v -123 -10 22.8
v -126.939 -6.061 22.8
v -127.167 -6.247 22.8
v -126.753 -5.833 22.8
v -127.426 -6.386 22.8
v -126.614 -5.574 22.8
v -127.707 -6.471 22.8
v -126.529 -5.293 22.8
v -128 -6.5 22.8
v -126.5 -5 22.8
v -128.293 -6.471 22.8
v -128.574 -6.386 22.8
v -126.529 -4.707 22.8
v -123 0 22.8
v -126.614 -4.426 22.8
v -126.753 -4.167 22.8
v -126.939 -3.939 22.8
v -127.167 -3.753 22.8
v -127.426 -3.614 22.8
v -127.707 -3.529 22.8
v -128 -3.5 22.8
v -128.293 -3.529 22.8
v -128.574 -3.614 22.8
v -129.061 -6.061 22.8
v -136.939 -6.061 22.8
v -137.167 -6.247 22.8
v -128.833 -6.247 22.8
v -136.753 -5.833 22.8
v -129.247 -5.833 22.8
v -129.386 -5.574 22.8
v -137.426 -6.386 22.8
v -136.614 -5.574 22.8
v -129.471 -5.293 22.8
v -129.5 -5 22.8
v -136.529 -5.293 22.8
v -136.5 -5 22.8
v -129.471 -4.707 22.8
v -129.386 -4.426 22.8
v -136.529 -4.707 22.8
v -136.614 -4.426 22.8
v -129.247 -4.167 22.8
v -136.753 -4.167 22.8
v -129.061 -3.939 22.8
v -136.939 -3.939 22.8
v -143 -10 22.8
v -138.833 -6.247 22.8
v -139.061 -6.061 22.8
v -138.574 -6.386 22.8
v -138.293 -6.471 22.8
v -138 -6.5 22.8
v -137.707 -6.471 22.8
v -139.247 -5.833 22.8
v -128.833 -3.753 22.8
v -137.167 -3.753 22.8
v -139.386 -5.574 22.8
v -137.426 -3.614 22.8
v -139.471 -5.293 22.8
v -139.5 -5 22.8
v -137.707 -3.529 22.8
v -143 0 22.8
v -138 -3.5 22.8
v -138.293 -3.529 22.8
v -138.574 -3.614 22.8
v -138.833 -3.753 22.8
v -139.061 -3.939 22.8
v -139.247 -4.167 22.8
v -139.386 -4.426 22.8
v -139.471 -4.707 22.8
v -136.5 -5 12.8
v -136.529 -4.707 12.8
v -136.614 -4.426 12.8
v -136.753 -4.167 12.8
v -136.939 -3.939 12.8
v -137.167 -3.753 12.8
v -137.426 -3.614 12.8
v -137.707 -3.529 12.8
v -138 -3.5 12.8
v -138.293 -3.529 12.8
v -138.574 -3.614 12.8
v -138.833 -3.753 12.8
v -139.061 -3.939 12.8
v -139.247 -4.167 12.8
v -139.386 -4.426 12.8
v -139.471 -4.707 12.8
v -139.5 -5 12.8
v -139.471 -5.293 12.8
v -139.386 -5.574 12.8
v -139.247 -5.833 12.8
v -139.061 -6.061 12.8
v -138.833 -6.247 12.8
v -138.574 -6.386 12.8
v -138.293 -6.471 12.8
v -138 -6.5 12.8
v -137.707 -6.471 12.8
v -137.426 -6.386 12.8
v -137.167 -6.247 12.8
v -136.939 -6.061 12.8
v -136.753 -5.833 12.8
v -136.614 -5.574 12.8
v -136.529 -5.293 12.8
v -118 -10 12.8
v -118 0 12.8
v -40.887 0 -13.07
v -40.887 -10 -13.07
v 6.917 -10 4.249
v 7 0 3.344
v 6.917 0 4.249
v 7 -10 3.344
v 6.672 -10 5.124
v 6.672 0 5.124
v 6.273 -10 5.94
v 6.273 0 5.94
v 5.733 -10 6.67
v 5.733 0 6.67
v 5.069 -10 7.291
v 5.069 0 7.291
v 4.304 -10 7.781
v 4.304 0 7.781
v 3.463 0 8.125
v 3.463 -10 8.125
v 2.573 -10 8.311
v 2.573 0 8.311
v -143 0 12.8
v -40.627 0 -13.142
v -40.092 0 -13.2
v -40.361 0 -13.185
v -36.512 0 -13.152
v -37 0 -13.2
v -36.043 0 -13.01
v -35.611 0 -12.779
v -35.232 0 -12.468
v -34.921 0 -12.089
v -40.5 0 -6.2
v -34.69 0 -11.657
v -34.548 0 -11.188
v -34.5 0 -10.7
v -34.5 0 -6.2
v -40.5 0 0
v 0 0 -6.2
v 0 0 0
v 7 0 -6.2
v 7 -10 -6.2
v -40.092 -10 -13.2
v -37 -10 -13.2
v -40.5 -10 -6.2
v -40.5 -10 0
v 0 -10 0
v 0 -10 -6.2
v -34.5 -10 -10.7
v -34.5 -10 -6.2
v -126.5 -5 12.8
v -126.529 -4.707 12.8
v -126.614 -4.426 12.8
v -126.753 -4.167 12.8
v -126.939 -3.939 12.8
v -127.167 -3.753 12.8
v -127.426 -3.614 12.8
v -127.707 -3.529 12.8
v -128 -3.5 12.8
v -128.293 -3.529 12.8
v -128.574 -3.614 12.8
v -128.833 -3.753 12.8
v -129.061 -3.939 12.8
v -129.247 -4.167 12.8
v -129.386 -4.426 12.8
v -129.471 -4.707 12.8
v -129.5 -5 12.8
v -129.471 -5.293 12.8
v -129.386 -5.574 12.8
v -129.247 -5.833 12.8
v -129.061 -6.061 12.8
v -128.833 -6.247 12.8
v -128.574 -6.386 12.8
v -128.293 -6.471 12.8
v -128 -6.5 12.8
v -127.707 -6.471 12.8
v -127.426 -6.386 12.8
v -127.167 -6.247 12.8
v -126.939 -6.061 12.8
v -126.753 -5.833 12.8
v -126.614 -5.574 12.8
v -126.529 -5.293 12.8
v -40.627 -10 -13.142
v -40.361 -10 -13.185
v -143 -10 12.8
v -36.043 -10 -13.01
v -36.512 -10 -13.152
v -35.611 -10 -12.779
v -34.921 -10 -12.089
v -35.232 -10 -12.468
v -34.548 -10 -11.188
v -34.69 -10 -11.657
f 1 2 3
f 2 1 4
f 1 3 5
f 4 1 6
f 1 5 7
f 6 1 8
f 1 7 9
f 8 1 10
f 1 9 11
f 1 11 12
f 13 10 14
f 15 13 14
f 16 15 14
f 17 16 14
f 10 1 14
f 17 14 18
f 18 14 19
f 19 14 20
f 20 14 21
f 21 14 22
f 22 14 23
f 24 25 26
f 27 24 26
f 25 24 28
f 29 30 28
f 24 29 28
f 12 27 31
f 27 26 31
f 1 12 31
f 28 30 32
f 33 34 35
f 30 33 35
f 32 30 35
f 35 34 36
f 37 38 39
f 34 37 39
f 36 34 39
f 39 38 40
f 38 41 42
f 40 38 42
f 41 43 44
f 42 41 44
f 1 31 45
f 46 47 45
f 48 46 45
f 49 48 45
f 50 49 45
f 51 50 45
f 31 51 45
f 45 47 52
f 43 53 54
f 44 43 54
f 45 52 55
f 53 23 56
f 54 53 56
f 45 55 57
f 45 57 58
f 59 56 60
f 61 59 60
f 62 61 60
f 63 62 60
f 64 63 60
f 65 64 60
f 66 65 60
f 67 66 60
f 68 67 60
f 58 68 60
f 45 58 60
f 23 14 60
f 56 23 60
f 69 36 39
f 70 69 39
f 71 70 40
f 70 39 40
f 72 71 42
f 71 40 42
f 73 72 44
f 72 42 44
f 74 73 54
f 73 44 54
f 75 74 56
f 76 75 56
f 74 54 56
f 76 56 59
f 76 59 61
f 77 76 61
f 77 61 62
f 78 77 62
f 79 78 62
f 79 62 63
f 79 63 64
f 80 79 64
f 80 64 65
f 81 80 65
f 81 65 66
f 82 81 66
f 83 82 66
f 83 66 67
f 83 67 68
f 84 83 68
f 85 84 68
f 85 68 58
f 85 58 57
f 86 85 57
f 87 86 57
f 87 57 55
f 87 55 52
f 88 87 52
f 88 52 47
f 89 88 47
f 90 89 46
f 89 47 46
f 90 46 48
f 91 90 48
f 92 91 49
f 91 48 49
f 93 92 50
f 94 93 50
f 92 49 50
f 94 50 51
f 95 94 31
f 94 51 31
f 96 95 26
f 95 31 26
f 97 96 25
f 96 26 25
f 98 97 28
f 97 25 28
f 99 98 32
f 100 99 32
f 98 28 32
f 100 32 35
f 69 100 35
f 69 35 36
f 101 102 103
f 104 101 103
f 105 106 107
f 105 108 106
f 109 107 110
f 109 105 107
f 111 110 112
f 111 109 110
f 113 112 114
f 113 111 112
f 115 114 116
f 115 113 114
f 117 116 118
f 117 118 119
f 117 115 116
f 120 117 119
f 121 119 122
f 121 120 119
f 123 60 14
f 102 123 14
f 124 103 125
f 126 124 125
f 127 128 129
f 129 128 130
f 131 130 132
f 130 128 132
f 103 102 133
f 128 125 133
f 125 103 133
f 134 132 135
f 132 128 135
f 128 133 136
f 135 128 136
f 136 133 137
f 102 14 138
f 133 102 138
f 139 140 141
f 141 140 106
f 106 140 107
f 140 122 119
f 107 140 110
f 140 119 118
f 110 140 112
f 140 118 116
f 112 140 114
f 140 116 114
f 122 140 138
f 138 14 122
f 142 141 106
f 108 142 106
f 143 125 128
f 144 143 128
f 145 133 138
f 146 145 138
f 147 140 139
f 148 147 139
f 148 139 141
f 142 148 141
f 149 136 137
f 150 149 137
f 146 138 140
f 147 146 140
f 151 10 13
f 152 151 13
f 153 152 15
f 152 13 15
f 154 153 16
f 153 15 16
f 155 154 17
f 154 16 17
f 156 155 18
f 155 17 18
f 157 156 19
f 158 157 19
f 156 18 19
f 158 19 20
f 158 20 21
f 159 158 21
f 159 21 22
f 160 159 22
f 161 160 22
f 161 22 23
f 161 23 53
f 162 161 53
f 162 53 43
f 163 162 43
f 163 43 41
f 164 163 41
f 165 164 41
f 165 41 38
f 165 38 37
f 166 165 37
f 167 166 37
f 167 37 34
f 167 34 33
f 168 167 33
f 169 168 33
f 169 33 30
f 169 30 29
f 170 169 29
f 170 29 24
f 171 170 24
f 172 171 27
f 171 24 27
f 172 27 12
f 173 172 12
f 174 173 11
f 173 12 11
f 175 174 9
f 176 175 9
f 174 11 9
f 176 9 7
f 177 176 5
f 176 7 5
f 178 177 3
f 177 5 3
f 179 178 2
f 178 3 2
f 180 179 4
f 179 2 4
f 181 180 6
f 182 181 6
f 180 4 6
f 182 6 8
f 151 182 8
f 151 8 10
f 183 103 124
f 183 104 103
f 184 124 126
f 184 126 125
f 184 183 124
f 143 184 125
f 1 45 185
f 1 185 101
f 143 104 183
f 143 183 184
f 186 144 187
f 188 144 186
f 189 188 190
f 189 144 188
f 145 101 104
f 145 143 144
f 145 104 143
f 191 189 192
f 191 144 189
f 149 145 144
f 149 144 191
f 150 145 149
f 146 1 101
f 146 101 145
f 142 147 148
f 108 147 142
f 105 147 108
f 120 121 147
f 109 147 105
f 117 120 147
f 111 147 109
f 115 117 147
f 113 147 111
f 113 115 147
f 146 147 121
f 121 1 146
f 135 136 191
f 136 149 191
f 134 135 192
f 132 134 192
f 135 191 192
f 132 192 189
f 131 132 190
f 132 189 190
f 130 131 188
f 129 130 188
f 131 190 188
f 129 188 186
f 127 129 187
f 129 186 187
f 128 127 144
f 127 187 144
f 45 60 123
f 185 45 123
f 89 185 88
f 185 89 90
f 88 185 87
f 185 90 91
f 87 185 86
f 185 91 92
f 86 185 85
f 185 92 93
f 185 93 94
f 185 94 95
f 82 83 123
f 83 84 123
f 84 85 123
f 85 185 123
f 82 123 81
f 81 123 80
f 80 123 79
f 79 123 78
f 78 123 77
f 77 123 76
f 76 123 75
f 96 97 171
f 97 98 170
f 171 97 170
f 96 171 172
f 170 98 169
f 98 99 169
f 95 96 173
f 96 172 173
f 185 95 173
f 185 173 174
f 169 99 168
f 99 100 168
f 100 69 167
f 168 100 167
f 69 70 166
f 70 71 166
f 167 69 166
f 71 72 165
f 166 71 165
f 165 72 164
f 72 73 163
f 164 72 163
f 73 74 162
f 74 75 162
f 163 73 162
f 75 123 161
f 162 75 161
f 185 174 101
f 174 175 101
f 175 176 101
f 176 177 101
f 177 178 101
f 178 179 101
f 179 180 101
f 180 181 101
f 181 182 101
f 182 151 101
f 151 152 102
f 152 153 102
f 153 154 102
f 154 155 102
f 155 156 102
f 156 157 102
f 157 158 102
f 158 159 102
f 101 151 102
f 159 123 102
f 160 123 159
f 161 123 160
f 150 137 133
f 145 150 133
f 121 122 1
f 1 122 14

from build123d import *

# Parameters (mm, degrees)
F1_DEPTH = 10
F2_R     = 5
F3_R     = 2.5
F4_R     = 1.5
F5_DEPTH = 25


with BuildPart() as f1:
    # F0 (on Front) → F1 (new body)
    with BuildSketch(Plane.XZ):
        Polygon((-40.5, 0), (0, 0), (0, -6.2), (7, -6.2), (7, 7.8), (-123, 22.8), (-143, 22.8), (-143, 12.8), (-118, 12.8), (-40.5, -13.2), (-34.5, -13.2), (-34.5, -6.2), (-40.5, -6.2), align=None)
    extrude(amount=F1_DEPTH)

    # F2
    f2_edges = [f1.edges().sort_by_distance(p)[0] for p in [
        (7, -5, 7.8),
    ]]
    fillet(f2_edges, radius=F2_R)

    # F3
    f3_edges = [f1.edges().sort_by_distance(p)[0] for p in [
        (-34.5, -5, -13.2),
        (-40.5, -5, -13.2),
    ]]
    fillet(f3_edges, radius=F3_R)

    # F4 (on face) → F5 (cut)
    with BuildSketch(Plane.XY.offset(22.8)):
        with Locations((-128, -5)):
            Circle(F4_R)
        with Locations((-138, -5)):
            Circle(F4_R)
    extrude(amount=-F5_DEPTH, mode=Mode.SUBTRACT)


solid = f1.part
